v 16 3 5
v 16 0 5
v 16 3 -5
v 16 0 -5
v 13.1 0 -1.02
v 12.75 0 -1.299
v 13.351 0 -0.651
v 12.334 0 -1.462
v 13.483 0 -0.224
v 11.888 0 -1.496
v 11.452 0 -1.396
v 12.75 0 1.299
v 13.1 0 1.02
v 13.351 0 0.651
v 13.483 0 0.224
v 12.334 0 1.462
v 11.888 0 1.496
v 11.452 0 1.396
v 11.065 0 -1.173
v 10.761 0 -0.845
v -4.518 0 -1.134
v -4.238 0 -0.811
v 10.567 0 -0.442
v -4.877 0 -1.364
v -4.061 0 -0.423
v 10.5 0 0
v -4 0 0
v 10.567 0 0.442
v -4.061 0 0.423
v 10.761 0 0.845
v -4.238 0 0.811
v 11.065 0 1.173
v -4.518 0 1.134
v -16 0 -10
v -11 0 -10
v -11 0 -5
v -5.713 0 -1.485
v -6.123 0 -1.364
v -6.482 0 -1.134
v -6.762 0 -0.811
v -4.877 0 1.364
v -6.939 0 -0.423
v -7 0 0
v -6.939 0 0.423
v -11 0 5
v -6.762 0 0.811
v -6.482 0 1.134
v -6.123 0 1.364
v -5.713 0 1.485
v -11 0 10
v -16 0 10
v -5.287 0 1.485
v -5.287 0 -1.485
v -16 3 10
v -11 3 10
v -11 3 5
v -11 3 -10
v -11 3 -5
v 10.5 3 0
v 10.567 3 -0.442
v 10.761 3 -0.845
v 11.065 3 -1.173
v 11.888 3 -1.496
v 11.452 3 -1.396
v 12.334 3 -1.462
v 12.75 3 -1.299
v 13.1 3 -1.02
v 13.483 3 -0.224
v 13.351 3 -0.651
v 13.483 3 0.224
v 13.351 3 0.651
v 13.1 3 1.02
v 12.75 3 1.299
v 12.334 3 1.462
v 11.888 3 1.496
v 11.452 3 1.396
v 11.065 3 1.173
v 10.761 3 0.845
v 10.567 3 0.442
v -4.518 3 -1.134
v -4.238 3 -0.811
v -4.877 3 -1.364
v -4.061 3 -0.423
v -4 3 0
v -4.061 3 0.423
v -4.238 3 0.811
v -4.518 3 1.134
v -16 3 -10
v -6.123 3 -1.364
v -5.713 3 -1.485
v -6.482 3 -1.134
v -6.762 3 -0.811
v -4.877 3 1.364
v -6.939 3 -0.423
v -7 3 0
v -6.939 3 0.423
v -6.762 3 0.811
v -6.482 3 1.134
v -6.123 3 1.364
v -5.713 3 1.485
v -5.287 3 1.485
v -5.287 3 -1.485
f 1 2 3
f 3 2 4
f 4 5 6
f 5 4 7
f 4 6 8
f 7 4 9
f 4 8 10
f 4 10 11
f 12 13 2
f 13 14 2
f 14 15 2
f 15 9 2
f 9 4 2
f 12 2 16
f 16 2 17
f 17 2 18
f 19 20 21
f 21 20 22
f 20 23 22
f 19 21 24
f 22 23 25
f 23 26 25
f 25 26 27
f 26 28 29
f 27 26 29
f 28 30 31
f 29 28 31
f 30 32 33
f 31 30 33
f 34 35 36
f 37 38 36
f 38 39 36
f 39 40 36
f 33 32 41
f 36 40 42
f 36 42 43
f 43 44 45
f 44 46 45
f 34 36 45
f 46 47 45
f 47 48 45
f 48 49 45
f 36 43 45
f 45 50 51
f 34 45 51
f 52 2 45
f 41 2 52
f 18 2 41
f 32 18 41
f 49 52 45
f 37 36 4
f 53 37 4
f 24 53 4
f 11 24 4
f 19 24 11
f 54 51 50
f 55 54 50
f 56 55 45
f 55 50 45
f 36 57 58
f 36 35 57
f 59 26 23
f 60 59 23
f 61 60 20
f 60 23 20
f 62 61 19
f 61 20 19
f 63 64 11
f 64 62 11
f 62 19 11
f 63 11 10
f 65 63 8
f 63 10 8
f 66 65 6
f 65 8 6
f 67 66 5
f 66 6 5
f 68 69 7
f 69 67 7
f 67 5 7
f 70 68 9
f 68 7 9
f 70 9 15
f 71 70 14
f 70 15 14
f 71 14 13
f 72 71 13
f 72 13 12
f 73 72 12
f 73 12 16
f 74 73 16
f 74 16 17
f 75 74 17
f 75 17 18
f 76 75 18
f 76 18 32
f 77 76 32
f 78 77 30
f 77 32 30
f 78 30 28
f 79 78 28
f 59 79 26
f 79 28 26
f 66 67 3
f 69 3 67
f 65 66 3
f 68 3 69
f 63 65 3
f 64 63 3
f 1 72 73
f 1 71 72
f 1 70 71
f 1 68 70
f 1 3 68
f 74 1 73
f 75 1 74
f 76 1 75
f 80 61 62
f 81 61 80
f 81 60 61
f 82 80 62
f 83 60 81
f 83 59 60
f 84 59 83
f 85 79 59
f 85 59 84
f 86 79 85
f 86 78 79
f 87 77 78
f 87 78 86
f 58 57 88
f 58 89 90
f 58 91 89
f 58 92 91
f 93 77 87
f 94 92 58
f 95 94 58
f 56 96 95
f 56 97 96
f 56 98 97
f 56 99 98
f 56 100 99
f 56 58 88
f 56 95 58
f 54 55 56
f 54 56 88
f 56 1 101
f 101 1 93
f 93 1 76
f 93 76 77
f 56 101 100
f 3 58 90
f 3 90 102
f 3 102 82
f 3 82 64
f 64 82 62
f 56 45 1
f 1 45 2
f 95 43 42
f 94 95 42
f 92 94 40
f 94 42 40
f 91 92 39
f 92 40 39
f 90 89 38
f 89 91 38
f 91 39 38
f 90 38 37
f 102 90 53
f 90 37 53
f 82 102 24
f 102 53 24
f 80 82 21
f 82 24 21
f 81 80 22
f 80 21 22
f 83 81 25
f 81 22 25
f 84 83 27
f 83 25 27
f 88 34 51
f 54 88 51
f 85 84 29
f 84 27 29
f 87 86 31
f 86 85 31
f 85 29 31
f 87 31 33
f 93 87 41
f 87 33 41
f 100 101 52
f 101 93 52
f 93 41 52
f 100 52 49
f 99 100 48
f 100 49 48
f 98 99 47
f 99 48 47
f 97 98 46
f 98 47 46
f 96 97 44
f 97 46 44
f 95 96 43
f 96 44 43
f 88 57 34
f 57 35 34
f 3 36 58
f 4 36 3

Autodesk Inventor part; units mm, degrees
ref_plane "YZ Plane" through (0, 0, 0) normal (1, 0, 0) x (0, 1, 0)
ref_plane "XZ Plane" through (0, 0, 0) normal (0, 1, 0) x (-1, 0, 0)
ref_plane "XY Plane" through (0, 0, 0) normal (0, 0, 1) x (1, 0, 0)
sketch "Sketch1" plane through (0, 0, 0) normal (0, 1, 0) x (-1, 0, 0)
  line L0 (16, 10) -> (-16, 10)
  line L1 (-16, 10) -> (-16, -10)
  line L2 (-16, -10) -> (16, -10)
  line L3 (16, -10) -> (16, 10)
  line L4 (16, 10) -> (-16, -10) construction
  line L5 (-16, 10) -> (16, -10) construction
  line L6 (-16, -10) -> (11, -10)
  line L7 (11, -10) -> (11, -5)
  line L8 (11, -5) -> (-16, -5)
  line L9 (-16, -5) -> (-16, -10)
  line L10 (-16, 10) -> (11, 10)
  line L11 (11, 10) -> (11, 5)
  line L12 (11, 5) -> (-16, 5)
  line L13 (-16, 5) -> (-16, 10)
  line L14 (11, 0) -> (8, 0)
  line L15 (8, 0) -> (5.5, 0)
  line L16 (5.5, 0) -> (-12, 0)
  circle A0 centre (5.5, 0) radius 1.5
  circle A1 centre (-12, 0) radius 1.5
  point P0 (0, 0)
  dimension "d0" = 32
  dimension "d1" = 20
  dimension "d2" = 27
  dimension "d3" = 5
  dimension "d4" = 27
  dimension "d5" = 5
  dimension "d6" = 3
  dimension "d7" = 2.5
  dimension "d8" = 17.5
  dimension "d9" = 3
  dimension "d10" = 3
  dimension "d13" = 10
extrude "Extrusion1" add sketch "Sketch1" along normal blind 3 contours L3 L2 L7 L8 L1 L12 L11 L0
sketch "Sketch2" plane through (0, 3, 0) normal (0, 1, 0) x (1, 0, 0)
  point P0 (0, 0)
properties part number "Stand T Sd Serayu 2024"
